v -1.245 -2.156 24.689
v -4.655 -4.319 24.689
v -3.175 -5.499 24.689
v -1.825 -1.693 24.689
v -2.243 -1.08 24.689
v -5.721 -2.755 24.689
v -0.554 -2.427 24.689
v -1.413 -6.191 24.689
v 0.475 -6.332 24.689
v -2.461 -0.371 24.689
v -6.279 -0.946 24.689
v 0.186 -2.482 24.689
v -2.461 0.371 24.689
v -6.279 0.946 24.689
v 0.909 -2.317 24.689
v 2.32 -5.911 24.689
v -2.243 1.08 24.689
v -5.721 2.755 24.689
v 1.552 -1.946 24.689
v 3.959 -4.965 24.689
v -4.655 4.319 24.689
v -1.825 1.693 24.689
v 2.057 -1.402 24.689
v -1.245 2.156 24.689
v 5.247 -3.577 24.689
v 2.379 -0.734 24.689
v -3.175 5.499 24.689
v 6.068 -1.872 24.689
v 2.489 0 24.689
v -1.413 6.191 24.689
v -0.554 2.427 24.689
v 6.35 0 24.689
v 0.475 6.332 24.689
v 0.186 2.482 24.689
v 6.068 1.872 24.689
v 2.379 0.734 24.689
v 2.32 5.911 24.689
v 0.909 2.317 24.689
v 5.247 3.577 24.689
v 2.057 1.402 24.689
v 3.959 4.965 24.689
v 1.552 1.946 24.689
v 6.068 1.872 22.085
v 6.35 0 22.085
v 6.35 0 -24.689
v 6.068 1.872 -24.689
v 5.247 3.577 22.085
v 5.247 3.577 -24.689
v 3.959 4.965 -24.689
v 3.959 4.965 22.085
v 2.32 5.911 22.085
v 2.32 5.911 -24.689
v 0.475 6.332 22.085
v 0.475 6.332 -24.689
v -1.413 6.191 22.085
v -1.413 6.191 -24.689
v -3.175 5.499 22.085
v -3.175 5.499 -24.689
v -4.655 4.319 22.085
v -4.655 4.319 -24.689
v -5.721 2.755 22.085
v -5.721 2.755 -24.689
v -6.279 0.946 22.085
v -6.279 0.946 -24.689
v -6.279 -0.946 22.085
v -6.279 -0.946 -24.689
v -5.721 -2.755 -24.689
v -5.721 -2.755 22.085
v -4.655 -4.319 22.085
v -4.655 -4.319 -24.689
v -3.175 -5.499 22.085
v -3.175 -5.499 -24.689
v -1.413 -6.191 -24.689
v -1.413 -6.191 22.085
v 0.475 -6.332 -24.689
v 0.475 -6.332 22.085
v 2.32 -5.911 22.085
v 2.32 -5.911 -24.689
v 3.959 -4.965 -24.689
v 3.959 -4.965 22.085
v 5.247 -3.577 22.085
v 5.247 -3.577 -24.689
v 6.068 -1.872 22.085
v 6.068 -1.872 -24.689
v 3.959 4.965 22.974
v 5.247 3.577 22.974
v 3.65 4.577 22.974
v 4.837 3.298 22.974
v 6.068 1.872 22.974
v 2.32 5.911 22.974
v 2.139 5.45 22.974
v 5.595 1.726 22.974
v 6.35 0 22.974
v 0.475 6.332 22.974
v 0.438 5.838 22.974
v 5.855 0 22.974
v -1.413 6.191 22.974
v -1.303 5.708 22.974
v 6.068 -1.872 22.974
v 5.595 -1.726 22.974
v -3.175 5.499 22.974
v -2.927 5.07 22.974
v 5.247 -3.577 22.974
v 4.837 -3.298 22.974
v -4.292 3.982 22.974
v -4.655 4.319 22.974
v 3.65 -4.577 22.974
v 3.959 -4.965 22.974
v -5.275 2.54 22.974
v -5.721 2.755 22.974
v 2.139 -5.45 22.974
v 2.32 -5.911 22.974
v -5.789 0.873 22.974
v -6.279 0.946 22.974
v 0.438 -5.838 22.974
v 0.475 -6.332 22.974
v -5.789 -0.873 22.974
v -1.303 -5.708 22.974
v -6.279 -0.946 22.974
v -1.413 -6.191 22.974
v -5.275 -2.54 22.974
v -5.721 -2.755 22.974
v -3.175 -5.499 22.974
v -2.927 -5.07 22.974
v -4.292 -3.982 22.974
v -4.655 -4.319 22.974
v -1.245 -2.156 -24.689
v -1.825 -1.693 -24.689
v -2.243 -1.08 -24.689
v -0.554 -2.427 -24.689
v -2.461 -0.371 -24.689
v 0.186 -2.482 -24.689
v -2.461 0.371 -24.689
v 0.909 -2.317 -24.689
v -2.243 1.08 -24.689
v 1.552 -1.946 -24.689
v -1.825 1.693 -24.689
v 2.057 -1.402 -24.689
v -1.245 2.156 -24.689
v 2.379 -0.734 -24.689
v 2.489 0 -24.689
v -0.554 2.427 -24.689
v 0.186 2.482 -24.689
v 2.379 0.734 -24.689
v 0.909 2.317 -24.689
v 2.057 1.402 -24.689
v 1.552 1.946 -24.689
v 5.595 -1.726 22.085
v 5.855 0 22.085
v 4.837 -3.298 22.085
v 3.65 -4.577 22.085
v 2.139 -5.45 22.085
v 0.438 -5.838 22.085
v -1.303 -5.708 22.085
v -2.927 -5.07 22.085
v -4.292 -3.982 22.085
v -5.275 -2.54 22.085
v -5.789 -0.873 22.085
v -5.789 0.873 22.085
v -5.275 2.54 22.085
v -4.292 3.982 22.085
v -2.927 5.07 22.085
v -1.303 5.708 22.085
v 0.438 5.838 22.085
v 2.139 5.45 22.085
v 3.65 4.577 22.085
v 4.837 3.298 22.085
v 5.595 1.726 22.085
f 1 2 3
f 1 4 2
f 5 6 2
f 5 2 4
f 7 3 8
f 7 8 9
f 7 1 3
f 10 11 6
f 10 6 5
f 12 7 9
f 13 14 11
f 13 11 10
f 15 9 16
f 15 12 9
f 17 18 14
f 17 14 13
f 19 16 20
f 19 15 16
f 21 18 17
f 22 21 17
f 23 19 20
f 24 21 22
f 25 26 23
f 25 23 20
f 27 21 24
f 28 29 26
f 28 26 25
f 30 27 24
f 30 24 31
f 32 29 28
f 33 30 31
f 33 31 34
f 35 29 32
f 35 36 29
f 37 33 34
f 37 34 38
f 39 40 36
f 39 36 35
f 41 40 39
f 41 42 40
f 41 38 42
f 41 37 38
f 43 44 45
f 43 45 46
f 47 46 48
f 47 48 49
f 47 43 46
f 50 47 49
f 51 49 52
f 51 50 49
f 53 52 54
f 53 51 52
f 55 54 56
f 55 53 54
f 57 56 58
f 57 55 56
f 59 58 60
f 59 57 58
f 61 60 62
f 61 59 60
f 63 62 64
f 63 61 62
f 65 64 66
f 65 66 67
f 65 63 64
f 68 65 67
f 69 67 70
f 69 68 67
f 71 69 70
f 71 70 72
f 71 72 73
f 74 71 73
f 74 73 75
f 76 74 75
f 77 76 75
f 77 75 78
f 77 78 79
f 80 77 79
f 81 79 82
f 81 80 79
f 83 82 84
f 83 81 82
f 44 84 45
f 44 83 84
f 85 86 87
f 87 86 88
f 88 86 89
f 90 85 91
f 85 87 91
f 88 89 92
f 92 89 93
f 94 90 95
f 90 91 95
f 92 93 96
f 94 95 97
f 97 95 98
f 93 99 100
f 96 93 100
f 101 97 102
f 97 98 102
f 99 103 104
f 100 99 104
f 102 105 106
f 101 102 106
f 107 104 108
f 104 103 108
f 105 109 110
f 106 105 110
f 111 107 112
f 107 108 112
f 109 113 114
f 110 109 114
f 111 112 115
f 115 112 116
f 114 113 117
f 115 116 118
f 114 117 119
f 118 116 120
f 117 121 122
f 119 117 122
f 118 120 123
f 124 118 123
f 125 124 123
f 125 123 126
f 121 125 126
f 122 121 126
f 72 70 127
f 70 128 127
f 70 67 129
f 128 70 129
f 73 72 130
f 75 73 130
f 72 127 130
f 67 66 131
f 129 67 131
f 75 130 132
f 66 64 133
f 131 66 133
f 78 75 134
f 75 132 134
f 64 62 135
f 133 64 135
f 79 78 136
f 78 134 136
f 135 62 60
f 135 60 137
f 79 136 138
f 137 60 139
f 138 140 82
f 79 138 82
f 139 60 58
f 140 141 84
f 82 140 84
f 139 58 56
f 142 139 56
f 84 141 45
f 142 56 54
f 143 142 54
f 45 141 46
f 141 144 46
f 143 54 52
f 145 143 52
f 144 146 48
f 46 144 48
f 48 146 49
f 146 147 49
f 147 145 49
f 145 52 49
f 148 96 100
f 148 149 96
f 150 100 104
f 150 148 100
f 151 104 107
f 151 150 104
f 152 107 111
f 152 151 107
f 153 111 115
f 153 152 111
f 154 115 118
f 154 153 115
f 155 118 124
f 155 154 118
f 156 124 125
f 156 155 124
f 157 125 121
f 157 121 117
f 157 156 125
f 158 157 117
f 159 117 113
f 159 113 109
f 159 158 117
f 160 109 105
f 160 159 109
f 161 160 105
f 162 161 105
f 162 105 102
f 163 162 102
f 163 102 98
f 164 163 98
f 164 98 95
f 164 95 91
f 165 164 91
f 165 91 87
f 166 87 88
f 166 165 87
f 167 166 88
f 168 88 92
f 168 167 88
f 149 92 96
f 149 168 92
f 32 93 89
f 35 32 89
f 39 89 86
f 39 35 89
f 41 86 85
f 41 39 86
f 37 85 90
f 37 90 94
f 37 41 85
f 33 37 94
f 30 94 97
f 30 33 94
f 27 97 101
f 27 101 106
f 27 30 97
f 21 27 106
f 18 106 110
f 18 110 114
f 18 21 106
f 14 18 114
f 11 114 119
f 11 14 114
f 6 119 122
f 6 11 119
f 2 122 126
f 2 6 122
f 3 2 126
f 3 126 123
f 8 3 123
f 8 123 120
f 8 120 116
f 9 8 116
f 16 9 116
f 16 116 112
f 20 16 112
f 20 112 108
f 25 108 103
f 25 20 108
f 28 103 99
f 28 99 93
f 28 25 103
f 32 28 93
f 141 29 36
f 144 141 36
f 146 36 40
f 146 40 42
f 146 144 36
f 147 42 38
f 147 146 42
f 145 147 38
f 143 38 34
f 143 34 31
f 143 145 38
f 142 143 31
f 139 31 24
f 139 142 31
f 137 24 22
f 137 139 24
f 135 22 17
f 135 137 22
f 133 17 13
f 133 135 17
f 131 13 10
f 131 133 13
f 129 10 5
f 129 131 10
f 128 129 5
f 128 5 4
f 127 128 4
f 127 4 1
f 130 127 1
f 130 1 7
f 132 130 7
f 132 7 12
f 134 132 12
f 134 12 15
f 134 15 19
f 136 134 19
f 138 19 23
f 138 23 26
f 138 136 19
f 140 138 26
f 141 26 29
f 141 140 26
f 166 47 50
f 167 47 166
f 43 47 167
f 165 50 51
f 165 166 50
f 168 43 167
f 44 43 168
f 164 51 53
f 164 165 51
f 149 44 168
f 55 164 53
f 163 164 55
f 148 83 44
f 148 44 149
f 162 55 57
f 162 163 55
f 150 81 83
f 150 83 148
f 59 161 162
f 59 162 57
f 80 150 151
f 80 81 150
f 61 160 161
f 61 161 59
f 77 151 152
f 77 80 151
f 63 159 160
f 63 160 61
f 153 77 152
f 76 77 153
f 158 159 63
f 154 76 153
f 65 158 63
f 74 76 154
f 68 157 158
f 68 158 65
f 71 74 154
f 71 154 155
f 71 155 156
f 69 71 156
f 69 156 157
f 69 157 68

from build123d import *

# Parameters (mm, degrees)
SKETCH1_R           = 6.35
SKETCH1_R_2         = 2.4892
BOSS_EXTRUDE1_DEPTH = 24.6888
SKETCH2_W           = 0.889
SKETCH2_H           = 1.0033


with BuildPart() as part:
    # Sketch1 → Boss-Extrude1 (new, symmetric)
    with BuildSketch(Plane.XY):
        Circle(SKETCH1_R)
        Circle(SKETCH1_R_2, mode=Mode.SUBTRACT)
    extrude(amount=BOSS_EXTRUDE1_DEPTH, both=True)

    # Sketch2 → Cut-Revolve1 (revolve, cut)
    with BuildSketch(Plane(origin=(0, 0, 0), x_dir=(0, 0, -1), z_dir=(1, 0, 0)), mode=Mode.PRIVATE) as cut_revolve1_sk:
        with Locations((-22.5298, 6.35635)):
            Rectangle(SKETCH2_W, SKETCH2_H)
    revolve(cut_revolve1_sk.sketch.rotate(Axis((0, 0, 2.405637885), (0, 0, -1)), 90), axis=Axis((0, 0, 2.405637885), (0, 0, -1)), mode=Mode.SUBTRACT)


solid = part.part
